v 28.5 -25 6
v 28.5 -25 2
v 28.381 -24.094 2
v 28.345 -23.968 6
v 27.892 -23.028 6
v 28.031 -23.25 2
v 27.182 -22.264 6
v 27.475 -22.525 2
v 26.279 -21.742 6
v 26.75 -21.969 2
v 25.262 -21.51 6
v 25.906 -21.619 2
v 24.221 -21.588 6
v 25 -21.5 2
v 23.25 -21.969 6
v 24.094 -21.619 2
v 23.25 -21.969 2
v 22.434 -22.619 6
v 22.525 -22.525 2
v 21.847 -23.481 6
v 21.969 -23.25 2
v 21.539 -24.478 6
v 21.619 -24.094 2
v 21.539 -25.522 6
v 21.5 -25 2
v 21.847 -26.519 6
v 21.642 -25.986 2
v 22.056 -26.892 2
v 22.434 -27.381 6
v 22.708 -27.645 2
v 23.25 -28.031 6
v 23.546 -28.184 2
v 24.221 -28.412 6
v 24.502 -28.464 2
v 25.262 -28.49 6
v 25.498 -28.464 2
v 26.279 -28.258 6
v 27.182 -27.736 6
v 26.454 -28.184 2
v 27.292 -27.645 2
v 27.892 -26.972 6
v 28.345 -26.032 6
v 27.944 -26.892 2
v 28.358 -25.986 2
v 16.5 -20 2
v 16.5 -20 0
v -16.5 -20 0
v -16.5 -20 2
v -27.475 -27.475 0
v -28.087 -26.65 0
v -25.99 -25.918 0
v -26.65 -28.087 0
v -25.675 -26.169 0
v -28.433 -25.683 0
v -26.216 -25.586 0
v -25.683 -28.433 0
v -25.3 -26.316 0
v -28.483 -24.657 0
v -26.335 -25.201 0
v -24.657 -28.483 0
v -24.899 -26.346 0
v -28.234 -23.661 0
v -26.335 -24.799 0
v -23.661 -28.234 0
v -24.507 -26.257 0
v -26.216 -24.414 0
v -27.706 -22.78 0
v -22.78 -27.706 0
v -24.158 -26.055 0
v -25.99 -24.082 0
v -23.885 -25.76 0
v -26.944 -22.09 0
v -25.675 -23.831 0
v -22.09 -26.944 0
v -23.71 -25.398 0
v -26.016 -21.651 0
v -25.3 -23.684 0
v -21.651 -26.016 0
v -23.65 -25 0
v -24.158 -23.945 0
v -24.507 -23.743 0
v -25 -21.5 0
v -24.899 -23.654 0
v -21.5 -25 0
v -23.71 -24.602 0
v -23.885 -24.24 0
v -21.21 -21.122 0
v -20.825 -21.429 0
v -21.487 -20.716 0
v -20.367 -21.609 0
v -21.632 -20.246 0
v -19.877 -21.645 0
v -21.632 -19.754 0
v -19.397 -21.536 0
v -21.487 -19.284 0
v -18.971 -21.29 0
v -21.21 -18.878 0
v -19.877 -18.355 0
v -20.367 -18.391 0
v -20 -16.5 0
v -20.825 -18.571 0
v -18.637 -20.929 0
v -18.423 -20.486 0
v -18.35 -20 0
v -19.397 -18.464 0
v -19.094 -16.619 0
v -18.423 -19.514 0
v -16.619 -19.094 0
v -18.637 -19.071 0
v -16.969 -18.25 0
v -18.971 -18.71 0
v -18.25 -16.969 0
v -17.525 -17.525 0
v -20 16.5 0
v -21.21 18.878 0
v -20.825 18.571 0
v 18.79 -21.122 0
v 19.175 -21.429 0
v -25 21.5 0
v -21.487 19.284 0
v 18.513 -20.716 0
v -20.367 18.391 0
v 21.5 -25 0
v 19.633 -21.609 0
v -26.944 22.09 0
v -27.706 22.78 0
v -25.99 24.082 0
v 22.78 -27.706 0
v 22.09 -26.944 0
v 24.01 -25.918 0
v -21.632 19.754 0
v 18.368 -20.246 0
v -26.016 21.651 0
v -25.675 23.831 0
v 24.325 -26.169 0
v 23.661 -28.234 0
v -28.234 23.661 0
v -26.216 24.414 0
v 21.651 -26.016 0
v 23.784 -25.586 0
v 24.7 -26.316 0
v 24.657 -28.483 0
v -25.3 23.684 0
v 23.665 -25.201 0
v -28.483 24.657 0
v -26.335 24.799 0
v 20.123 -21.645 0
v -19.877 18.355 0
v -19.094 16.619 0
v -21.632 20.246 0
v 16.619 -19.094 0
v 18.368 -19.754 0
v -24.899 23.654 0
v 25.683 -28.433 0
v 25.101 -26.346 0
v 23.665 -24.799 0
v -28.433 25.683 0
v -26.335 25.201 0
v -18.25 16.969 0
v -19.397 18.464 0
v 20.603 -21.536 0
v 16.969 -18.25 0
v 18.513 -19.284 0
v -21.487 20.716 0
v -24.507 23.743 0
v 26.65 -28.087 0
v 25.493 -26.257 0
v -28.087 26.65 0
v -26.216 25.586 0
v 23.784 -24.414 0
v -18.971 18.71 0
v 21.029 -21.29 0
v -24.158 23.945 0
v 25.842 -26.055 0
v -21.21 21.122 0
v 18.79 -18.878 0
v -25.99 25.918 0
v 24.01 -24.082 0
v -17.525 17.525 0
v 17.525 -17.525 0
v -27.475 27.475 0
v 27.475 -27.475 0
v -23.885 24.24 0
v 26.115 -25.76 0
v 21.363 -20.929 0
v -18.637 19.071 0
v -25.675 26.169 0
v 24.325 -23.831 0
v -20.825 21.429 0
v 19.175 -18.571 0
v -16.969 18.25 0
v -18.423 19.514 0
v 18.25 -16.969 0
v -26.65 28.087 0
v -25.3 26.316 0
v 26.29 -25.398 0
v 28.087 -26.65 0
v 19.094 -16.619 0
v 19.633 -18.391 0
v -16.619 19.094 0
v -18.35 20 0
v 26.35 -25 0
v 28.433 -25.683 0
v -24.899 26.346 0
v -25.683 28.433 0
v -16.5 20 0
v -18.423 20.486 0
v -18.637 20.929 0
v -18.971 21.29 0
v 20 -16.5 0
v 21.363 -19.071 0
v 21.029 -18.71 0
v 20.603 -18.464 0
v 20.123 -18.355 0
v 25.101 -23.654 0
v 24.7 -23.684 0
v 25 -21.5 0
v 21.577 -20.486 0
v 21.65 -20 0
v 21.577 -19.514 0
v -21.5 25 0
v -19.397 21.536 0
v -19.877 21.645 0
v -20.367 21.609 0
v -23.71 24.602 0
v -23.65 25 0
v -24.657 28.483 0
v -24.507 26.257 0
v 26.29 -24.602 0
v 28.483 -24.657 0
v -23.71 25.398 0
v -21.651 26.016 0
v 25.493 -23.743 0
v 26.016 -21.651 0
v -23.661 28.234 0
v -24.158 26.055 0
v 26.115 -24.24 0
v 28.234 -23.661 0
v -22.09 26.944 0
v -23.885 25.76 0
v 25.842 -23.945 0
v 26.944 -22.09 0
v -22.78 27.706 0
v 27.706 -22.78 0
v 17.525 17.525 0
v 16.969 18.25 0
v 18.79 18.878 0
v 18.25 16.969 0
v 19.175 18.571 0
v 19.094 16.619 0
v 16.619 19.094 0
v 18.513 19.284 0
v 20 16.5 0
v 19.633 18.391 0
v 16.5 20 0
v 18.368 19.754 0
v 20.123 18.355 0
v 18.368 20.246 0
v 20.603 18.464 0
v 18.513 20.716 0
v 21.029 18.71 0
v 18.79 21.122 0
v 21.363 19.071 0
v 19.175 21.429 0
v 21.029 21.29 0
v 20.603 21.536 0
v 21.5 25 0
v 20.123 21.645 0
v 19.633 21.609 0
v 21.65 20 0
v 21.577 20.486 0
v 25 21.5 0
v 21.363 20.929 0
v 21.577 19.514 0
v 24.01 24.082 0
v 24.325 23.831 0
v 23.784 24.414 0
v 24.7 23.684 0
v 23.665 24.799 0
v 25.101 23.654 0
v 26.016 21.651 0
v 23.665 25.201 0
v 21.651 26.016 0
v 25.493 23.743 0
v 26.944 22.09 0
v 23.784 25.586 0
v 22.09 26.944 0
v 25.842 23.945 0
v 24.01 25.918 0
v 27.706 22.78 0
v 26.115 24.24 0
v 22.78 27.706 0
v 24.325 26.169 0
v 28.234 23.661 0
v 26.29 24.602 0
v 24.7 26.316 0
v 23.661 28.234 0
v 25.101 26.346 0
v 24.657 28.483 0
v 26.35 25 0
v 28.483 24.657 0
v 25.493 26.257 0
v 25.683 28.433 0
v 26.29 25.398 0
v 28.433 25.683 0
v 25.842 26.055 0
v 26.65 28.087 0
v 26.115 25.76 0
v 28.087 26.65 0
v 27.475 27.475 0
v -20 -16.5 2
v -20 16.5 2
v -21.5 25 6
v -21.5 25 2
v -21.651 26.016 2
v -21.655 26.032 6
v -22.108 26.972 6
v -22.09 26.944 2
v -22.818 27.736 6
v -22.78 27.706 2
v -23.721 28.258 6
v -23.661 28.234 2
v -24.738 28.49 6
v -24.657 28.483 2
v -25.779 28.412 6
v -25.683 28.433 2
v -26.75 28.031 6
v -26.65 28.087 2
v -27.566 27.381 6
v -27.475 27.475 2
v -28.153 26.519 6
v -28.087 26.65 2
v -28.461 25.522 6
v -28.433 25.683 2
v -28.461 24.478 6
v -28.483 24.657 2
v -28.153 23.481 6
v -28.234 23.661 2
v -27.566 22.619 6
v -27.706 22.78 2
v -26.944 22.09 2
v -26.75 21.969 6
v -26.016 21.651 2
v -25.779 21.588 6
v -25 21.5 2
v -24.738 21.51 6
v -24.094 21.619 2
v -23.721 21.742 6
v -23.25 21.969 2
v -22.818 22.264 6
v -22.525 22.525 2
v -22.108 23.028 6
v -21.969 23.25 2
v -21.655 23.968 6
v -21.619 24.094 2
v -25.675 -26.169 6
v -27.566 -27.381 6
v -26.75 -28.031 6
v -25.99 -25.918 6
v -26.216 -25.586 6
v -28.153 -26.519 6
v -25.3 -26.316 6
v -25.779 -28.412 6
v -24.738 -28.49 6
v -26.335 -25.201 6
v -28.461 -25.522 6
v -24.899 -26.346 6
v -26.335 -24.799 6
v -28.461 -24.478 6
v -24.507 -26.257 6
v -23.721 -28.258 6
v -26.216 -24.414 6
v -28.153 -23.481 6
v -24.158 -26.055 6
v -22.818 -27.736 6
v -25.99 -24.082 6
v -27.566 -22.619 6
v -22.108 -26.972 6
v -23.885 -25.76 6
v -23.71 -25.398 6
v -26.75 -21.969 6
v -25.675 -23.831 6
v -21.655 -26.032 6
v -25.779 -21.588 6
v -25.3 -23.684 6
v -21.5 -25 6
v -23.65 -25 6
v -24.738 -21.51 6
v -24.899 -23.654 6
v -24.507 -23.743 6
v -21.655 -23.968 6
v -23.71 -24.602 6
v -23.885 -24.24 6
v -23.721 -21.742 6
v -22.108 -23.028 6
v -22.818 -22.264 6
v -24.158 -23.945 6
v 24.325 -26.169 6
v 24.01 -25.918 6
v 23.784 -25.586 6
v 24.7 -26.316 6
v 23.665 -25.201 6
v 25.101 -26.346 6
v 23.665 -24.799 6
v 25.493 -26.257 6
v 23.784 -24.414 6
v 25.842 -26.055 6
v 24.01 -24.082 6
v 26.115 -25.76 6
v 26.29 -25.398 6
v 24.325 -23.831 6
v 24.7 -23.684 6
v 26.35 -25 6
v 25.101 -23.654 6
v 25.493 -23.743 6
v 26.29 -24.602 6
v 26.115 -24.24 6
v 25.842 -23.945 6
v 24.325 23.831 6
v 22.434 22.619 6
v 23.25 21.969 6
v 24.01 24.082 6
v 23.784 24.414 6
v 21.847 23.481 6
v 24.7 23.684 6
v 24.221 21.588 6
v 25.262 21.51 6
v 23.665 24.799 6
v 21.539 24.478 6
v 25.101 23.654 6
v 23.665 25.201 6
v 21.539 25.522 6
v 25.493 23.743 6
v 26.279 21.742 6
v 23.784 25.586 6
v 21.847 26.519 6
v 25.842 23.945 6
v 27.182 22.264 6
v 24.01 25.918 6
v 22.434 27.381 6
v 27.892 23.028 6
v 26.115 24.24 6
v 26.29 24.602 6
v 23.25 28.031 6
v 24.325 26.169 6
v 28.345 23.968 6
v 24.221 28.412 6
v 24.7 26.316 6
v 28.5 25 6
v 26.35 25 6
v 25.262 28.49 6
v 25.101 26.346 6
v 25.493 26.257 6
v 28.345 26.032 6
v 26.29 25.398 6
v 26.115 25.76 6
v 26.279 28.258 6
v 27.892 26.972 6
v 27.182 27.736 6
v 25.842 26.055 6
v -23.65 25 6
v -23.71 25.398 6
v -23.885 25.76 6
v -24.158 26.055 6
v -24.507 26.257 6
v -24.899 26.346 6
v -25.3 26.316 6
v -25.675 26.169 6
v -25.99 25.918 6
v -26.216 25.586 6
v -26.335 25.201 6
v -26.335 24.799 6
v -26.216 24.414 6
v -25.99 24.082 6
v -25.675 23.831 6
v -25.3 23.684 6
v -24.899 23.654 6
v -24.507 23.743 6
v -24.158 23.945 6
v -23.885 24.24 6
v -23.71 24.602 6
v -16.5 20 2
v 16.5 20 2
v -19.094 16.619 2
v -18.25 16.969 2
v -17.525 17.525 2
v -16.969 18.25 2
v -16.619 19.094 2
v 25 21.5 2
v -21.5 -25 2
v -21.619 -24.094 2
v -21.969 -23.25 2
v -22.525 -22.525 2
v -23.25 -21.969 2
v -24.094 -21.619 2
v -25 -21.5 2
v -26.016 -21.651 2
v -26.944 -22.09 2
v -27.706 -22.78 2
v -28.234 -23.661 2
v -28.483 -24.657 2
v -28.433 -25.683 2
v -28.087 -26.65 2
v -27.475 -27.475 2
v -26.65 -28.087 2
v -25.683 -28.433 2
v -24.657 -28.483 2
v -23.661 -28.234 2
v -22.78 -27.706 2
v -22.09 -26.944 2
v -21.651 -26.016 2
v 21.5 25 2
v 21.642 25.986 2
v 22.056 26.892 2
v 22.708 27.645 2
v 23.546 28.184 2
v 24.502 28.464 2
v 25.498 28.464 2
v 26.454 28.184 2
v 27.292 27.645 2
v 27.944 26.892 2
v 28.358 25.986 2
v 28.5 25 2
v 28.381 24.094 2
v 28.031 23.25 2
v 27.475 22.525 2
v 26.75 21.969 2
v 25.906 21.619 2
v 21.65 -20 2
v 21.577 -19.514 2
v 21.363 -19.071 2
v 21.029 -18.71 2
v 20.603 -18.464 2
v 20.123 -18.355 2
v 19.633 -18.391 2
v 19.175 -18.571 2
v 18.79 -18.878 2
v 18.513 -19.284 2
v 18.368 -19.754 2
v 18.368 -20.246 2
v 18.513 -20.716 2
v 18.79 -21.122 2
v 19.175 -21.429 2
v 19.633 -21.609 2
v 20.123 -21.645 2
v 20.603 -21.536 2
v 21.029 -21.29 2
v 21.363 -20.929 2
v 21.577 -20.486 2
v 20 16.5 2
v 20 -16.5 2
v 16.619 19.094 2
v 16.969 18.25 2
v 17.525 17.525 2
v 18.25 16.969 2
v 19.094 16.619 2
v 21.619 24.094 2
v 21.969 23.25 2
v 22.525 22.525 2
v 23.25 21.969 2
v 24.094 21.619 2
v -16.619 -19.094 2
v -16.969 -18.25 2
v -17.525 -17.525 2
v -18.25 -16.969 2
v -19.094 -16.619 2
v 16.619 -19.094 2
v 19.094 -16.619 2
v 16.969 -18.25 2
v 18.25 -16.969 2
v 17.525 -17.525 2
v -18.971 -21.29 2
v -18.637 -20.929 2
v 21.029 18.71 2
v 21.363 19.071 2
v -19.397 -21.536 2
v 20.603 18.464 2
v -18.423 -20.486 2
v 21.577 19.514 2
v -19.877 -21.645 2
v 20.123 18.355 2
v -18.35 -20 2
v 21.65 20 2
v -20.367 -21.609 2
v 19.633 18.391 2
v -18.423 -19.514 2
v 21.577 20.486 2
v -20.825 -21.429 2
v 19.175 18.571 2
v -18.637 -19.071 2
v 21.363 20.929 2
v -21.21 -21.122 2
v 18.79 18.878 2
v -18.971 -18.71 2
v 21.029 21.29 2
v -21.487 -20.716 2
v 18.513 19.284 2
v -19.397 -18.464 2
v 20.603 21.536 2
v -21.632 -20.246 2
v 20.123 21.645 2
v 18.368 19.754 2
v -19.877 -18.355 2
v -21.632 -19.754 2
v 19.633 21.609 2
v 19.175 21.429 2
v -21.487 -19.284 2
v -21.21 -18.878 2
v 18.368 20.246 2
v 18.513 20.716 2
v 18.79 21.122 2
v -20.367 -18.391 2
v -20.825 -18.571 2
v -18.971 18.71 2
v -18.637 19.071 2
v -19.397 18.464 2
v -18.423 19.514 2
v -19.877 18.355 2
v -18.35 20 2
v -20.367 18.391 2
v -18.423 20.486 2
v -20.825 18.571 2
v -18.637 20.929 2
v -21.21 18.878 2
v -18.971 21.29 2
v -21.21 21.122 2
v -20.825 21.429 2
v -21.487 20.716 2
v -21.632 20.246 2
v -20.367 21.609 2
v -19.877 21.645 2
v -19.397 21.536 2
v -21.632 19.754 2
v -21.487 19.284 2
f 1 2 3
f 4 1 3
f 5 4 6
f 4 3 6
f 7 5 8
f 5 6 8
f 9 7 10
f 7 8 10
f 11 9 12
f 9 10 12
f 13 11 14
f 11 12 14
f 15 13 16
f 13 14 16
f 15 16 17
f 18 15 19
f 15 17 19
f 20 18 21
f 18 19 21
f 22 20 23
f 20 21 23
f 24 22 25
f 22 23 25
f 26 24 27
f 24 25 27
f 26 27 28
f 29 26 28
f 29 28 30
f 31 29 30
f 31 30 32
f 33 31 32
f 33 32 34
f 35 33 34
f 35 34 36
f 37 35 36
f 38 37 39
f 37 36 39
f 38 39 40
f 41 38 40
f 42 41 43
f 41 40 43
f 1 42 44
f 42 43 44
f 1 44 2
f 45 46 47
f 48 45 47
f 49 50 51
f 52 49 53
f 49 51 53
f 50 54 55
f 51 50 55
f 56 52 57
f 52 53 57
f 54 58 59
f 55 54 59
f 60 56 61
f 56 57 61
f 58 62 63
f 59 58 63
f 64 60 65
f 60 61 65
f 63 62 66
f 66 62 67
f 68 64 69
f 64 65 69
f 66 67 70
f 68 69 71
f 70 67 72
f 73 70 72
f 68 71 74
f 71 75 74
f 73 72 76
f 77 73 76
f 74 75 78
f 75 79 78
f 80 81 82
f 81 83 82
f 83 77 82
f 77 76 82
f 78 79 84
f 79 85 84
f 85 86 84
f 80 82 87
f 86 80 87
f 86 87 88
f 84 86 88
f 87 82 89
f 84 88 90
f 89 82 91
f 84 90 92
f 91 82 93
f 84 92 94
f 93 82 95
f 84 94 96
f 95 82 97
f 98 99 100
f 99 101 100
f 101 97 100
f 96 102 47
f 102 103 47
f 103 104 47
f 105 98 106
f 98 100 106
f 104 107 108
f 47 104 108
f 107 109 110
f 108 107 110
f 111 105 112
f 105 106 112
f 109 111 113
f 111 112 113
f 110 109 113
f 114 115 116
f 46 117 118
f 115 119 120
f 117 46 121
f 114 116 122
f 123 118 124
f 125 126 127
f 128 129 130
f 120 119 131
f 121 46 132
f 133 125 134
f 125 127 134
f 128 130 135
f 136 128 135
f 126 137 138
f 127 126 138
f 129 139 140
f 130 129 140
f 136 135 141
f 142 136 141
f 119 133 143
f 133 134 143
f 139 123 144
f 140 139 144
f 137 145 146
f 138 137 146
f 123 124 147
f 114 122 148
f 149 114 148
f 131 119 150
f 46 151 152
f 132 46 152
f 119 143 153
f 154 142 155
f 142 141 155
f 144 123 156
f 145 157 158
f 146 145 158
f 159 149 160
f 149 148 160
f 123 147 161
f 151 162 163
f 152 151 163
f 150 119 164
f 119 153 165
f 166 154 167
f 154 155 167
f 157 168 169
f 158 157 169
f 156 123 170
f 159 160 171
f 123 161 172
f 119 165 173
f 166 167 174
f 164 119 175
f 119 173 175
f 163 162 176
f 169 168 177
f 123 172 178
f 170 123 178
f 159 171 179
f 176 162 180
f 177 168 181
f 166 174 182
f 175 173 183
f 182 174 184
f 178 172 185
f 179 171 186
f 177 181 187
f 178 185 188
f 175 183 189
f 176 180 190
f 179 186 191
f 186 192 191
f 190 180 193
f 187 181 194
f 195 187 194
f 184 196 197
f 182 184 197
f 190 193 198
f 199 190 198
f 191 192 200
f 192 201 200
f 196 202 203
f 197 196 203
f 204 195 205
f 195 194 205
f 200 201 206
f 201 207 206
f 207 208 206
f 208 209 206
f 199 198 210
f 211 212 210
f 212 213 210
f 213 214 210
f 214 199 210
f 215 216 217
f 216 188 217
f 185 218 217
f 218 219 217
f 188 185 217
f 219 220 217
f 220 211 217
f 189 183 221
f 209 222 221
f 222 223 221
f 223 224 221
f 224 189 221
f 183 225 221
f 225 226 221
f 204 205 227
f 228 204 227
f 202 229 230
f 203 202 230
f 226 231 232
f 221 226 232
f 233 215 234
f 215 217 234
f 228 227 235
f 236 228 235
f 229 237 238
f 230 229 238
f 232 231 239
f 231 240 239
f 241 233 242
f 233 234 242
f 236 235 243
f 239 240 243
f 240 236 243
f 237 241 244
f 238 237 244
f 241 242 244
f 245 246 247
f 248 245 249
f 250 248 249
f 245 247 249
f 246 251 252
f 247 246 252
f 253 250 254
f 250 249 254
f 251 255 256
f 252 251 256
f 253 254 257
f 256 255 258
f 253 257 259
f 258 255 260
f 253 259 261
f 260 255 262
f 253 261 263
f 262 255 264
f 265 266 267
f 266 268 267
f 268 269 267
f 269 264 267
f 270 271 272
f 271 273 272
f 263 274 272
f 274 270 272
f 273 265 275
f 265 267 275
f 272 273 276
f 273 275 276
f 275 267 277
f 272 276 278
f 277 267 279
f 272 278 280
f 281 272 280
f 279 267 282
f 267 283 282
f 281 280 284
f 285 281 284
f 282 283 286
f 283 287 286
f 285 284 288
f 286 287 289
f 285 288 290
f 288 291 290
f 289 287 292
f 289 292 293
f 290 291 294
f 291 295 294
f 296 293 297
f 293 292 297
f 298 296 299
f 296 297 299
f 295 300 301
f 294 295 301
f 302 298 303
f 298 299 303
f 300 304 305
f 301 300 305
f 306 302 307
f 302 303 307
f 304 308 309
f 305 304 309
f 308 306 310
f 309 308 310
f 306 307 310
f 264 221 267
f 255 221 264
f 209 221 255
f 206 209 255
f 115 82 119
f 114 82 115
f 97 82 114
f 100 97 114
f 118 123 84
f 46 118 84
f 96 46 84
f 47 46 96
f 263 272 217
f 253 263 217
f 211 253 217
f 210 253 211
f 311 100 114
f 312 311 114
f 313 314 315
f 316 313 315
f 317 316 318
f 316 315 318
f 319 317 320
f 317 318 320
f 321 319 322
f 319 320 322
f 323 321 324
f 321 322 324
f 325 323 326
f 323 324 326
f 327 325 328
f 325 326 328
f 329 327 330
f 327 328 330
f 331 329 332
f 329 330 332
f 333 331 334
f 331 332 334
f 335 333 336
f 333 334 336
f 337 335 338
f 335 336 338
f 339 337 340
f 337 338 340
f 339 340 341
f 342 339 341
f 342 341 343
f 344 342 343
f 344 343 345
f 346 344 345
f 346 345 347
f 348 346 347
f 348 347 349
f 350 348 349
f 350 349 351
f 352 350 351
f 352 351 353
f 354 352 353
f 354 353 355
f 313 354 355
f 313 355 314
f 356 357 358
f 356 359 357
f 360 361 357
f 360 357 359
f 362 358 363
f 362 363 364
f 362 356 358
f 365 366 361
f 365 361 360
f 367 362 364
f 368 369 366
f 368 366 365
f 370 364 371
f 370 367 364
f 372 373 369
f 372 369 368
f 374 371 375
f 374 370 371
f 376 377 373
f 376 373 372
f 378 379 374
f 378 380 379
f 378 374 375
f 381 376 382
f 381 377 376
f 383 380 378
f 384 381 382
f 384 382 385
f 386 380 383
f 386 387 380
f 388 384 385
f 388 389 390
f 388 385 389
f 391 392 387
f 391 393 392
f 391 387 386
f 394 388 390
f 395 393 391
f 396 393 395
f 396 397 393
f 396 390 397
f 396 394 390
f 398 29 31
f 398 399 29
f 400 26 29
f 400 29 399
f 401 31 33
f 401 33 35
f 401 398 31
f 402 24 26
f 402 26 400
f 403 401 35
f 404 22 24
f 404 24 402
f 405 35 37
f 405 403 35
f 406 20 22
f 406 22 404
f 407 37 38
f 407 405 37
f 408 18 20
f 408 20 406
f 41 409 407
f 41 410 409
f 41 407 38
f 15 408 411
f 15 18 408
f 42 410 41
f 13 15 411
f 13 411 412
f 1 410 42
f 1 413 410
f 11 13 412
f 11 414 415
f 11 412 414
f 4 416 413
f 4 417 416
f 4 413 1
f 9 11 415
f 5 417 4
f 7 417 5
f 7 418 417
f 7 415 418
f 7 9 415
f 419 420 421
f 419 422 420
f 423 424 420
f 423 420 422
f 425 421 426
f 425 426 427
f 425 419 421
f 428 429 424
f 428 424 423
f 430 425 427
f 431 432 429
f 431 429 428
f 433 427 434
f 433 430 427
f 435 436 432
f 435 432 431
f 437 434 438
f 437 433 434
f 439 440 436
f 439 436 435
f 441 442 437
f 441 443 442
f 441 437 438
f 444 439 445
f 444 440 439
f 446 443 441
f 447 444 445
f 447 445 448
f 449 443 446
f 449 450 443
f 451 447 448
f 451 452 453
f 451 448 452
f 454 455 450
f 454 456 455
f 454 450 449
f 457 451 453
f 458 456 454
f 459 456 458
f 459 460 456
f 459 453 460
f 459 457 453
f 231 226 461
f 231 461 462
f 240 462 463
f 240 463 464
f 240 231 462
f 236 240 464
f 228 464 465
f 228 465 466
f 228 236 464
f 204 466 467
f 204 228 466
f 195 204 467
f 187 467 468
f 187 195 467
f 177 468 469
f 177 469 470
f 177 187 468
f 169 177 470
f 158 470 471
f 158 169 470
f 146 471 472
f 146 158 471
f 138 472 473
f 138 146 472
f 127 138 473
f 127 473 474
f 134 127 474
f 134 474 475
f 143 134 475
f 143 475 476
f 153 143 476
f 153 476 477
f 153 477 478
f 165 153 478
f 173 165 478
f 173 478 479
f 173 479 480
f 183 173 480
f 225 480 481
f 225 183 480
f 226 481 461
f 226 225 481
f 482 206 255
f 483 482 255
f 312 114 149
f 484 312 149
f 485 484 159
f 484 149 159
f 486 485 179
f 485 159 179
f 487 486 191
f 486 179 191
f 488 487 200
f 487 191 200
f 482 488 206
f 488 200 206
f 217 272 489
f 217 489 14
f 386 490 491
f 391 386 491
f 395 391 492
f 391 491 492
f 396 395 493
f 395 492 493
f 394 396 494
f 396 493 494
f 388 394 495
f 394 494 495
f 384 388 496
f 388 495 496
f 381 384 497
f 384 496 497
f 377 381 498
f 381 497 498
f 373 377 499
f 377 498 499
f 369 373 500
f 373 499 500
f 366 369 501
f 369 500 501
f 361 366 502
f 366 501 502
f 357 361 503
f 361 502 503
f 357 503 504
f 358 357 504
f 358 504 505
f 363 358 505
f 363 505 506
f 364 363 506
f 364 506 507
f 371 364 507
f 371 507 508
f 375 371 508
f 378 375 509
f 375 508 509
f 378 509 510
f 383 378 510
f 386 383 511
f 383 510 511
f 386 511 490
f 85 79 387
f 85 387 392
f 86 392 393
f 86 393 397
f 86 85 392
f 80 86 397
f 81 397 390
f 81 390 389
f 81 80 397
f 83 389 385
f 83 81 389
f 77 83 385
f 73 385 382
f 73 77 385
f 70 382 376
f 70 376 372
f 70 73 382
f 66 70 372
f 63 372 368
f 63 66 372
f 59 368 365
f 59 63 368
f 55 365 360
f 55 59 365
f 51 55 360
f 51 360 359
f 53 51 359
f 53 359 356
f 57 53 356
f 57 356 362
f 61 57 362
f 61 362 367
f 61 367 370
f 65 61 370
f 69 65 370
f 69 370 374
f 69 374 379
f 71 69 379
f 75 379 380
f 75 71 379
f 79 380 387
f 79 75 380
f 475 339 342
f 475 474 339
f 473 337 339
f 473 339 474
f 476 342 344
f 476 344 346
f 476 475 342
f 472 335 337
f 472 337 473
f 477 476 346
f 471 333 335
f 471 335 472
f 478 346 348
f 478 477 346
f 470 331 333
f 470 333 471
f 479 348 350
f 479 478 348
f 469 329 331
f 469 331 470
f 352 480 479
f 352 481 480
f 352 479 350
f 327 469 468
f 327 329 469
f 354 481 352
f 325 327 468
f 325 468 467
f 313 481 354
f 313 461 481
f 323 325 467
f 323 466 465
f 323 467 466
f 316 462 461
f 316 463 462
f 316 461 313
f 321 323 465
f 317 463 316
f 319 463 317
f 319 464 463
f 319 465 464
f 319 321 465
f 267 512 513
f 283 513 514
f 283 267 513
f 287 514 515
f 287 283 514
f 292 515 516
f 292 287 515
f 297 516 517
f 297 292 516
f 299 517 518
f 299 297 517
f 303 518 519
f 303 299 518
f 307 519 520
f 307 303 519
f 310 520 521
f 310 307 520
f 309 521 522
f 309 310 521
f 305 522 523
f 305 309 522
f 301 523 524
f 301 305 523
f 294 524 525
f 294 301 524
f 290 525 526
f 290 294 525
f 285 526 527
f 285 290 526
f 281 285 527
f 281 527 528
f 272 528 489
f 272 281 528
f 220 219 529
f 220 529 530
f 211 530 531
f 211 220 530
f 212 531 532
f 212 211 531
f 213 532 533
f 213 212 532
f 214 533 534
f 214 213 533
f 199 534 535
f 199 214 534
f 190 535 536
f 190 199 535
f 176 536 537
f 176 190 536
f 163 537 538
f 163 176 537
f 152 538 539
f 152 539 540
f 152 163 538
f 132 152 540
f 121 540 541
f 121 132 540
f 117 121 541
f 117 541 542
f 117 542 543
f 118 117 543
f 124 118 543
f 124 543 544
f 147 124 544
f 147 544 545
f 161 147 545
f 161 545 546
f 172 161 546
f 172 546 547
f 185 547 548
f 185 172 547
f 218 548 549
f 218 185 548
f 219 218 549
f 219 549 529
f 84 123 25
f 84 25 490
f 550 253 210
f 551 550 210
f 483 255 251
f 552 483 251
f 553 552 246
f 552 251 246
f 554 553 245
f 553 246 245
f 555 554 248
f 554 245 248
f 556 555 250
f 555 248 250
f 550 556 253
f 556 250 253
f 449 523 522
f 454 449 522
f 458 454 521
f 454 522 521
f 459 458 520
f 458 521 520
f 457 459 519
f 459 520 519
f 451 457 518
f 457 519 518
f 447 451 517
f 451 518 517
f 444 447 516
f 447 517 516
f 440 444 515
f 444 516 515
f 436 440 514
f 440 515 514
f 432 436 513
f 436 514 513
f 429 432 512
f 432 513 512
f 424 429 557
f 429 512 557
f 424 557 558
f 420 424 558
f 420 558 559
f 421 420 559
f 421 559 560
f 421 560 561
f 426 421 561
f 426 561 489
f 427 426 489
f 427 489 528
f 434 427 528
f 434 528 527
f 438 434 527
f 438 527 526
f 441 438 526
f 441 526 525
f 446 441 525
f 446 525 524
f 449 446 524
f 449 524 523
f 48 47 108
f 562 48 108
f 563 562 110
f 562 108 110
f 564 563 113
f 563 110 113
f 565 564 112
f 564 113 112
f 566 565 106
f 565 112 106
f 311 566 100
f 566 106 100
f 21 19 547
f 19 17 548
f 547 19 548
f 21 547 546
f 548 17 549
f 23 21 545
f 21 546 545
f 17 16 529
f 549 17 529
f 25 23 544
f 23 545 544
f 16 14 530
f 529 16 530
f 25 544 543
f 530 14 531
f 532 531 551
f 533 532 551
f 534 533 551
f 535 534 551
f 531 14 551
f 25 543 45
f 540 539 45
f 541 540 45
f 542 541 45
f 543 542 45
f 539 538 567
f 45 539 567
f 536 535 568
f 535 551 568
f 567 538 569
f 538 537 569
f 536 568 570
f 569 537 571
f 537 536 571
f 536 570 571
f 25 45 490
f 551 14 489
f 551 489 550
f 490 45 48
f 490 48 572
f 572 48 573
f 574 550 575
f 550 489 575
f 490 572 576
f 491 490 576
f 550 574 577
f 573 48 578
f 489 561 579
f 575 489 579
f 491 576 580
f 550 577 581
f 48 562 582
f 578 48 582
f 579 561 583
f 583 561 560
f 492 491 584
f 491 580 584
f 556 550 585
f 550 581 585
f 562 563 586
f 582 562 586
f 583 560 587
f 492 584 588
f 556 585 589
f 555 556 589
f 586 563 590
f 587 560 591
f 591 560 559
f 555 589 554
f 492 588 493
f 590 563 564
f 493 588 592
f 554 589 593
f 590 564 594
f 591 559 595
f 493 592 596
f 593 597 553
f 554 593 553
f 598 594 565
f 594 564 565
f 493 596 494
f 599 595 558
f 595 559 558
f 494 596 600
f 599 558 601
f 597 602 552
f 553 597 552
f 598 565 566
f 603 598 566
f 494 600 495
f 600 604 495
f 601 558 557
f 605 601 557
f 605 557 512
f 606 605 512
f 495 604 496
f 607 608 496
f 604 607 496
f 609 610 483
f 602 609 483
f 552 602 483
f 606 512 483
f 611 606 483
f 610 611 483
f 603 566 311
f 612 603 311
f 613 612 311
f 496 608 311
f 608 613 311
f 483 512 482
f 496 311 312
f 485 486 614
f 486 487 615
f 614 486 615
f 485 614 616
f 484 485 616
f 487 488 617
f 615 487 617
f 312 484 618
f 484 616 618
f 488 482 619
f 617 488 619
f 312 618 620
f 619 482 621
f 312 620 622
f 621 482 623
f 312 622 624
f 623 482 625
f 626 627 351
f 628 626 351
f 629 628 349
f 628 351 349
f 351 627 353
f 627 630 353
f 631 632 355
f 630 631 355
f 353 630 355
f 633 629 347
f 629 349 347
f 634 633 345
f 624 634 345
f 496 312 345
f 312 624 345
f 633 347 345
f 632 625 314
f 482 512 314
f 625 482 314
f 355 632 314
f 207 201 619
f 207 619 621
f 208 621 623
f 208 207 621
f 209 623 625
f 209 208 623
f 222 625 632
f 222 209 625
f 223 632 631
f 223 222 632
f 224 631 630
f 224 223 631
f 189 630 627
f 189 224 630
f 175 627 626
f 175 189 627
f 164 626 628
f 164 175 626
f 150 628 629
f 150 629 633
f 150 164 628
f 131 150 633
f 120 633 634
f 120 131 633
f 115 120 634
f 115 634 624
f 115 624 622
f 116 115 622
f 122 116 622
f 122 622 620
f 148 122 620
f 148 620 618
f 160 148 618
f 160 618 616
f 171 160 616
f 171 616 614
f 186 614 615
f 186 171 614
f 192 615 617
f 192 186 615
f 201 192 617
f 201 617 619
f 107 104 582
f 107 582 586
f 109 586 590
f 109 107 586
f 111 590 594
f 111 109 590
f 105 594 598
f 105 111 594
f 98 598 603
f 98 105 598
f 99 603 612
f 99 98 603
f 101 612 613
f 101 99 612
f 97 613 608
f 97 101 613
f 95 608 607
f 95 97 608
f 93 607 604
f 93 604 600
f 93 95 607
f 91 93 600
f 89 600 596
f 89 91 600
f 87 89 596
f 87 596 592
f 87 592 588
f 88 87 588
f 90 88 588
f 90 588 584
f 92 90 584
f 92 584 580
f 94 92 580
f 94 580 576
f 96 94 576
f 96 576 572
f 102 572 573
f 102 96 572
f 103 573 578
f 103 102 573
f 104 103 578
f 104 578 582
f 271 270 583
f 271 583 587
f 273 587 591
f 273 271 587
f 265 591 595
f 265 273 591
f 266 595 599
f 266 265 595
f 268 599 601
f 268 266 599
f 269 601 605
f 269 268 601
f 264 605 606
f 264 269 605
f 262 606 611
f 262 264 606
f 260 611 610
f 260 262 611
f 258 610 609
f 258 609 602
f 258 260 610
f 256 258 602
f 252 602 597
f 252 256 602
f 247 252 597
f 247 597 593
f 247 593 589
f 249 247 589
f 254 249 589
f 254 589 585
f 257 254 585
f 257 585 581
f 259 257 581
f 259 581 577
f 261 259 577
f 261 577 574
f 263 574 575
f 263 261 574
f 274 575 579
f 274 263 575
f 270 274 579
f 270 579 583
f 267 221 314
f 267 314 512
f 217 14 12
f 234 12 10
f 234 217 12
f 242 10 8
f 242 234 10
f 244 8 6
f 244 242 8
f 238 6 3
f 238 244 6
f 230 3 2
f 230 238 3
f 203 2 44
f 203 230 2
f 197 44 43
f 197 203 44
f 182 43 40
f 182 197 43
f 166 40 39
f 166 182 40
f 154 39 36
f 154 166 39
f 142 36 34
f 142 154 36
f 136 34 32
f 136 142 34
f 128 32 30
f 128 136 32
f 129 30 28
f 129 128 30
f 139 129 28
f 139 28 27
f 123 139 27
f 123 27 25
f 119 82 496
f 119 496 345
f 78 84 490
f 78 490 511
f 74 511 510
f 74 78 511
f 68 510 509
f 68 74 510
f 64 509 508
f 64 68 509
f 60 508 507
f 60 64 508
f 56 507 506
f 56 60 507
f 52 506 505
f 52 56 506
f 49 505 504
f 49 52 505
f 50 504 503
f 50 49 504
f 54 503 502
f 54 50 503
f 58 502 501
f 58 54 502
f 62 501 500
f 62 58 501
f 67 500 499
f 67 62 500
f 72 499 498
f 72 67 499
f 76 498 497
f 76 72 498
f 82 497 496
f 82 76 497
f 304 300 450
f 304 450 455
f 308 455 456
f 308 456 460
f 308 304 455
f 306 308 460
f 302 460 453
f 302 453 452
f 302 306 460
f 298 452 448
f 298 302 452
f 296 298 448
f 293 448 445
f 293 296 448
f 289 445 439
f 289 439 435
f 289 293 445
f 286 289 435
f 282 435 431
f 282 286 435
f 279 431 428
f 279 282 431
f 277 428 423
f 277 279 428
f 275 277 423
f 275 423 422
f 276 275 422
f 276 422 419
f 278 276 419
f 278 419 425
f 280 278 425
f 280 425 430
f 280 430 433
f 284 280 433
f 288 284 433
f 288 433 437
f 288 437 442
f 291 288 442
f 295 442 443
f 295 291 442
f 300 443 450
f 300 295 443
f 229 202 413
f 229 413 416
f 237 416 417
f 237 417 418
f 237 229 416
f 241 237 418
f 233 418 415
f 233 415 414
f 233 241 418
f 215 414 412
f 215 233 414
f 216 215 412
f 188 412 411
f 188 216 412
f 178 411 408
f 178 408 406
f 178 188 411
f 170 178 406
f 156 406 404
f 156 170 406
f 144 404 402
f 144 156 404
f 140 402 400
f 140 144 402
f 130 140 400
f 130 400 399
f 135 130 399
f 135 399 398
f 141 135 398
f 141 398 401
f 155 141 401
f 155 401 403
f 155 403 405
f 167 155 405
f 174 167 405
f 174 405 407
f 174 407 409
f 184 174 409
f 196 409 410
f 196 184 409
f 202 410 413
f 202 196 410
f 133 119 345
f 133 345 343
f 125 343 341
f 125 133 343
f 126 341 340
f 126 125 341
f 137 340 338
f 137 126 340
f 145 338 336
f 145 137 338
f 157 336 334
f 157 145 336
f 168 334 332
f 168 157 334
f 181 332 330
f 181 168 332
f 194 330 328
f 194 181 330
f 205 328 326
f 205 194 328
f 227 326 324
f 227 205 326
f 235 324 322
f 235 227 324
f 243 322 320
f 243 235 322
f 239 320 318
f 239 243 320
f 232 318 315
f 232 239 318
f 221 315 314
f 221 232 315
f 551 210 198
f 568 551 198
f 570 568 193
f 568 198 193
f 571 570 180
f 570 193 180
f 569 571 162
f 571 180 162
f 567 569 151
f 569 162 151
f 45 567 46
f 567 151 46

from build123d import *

# Parameters (mm, degrees)
SKETCH1_R           = 1.65
BOSS_EXTRUDE1_DEPTH = 2
SKETCH2_R           = 3.5
SKETCH2_R_2         = 1.65
SKETCH2_R_3         = 1.570665428
BOSS_EXTRUDE2_DEPTH = 4
EXTRUDE_THIN1_START = -6
SKETCH3_R           = 1.75
SKETCH3_R_2         = 1.35
EXTRUDE_THIN1_DEPTH = 6


with BuildPart() as part:
    # Sketch1 → Boss-Extrude1 (new body)
    with BuildSketch(Plane.XY):
        with BuildLine():
            Line((-21.5, 25), (21.5, 25))
            ThreePointArc((21.5, 25), (27.474873734, 27.474873734), (25, 21.5))
            Line((25, 21.5), (25, -21.5))
            ThreePointArc((25, -21.5), (27.474873734, -27.474873734), (21.5, -25))
            Line((21.5, -25), (-21.5, -25))
            ThreePointArc((-21.5, -25), (-27.474873734, -27.474873734), (-25, -21.5))
            Line((-25, -21.5), (-25, 21.5))
            ThreePointArc((-25, 21.5), (-27.474873734, 27.474873734), (-21.5, 25))
        make_face()
        with Locations((-20, 20)):
            Circle(SKETCH1_R, mode=Mode.SUBTRACT)
        with Locations((-25, 25)):
            Circle(SKETCH1_R, mode=Mode.SUBTRACT)
        with Locations((20, 20)):
            Circle(SKETCH1_R, mode=Mode.SUBTRACT)
        with Locations((25, 25)):
            Circle(SKETCH1_R, mode=Mode.SUBTRACT)
        with Locations((25, -25)):
            Circle(SKETCH1_R, mode=Mode.SUBTRACT)
        with Locations((20, -20)):
            Circle(SKETCH1_R, mode=Mode.SUBTRACT)
        with Locations((-20, -20)):
            Circle(SKETCH1_R, mode=Mode.SUBTRACT)
        with Locations((-25, -25)):
            Circle(SKETCH1_R, mode=Mode.SUBTRACT)
        with BuildLine():
            Line((-16.5, 20), (16.5, 20))
            ThreePointArc((16.5, 20), (17.525126266, 17.525126266), (20, 16.5))
            Line((20, 16.5), (20, -16.5))
            ThreePointArc((20, -16.5), (17.525126266, -17.525126266), (16.5, -20))
            Line((16.5, -20), (-16.5, -20))
            ThreePointArc((-16.5, -20), (-17.525126266, -17.525126266), (-20, -16.5))
            Line((-20, -16.5), (-20, 16.5))
            ThreePointArc((-20, 16.5), (-17.525126266, 17.525126266), (-16.5, 20))
        make_face(mode=Mode.SUBTRACT)
    extrude(amount=BOSS_EXTRUDE1_DEPTH)

    # Sketch2 → Boss-Extrude2 (add)
    with BuildSketch(Plane.XY.offset(2)):
        with Locations((-25, 25)):
            Circle(SKETCH2_R)
        with Locations((-25, 25)):
            Circle(SKETCH2_R_2, mode=Mode.SUBTRACT)
        with Locations((25, 25)):
            Circle(SKETCH2_R)
        with Locations((25, 25)):
            Circle(SKETCH2_R_3, mode=Mode.SUBTRACT)
        with Locations((-25, -25)):
            Circle(SKETCH2_R)
        with Locations((-25, -25)):
            Circle(SKETCH2_R_2, mode=Mode.SUBTRACT)
        with Locations((25, -25)):
            Circle(SKETCH2_R)
        with Locations((25, -25)):
            Circle(SKETCH2_R_2, mode=Mode.SUBTRACT)
    extrude(amount=BOSS_EXTRUDE2_DEPTH)

    # Sketch3 → Extrude-Thin1 (add)
    with BuildSketch(Plane.XY.offset(6).offset(EXTRUDE_THIN1_START)):
        with Locations((-25, 25)):
            Circle(SKETCH3_R)
        with Locations((-25, 25)):
            Circle(SKETCH3_R_2, mode=Mode.SUBTRACT)
        with Locations((25, 25)):
            Circle(SKETCH3_R)
        with Locations((25, 25)):
            Circle(SKETCH3_R_2, mode=Mode.SUBTRACT)
        with Locations((25, -25)):
            Circle(SKETCH3_R)
        with Locations((25, -25)):
            Circle(SKETCH3_R_2, mode=Mode.SUBTRACT)
        with Locations((-25, -25)):
            Circle(SKETCH3_R)
        with Locations((-25, -25)):
            Circle(SKETCH3_R_2, mode=Mode.SUBTRACT)
    extrude(amount=EXTRUDE_THIN1_DEPTH)


solid = part.part
